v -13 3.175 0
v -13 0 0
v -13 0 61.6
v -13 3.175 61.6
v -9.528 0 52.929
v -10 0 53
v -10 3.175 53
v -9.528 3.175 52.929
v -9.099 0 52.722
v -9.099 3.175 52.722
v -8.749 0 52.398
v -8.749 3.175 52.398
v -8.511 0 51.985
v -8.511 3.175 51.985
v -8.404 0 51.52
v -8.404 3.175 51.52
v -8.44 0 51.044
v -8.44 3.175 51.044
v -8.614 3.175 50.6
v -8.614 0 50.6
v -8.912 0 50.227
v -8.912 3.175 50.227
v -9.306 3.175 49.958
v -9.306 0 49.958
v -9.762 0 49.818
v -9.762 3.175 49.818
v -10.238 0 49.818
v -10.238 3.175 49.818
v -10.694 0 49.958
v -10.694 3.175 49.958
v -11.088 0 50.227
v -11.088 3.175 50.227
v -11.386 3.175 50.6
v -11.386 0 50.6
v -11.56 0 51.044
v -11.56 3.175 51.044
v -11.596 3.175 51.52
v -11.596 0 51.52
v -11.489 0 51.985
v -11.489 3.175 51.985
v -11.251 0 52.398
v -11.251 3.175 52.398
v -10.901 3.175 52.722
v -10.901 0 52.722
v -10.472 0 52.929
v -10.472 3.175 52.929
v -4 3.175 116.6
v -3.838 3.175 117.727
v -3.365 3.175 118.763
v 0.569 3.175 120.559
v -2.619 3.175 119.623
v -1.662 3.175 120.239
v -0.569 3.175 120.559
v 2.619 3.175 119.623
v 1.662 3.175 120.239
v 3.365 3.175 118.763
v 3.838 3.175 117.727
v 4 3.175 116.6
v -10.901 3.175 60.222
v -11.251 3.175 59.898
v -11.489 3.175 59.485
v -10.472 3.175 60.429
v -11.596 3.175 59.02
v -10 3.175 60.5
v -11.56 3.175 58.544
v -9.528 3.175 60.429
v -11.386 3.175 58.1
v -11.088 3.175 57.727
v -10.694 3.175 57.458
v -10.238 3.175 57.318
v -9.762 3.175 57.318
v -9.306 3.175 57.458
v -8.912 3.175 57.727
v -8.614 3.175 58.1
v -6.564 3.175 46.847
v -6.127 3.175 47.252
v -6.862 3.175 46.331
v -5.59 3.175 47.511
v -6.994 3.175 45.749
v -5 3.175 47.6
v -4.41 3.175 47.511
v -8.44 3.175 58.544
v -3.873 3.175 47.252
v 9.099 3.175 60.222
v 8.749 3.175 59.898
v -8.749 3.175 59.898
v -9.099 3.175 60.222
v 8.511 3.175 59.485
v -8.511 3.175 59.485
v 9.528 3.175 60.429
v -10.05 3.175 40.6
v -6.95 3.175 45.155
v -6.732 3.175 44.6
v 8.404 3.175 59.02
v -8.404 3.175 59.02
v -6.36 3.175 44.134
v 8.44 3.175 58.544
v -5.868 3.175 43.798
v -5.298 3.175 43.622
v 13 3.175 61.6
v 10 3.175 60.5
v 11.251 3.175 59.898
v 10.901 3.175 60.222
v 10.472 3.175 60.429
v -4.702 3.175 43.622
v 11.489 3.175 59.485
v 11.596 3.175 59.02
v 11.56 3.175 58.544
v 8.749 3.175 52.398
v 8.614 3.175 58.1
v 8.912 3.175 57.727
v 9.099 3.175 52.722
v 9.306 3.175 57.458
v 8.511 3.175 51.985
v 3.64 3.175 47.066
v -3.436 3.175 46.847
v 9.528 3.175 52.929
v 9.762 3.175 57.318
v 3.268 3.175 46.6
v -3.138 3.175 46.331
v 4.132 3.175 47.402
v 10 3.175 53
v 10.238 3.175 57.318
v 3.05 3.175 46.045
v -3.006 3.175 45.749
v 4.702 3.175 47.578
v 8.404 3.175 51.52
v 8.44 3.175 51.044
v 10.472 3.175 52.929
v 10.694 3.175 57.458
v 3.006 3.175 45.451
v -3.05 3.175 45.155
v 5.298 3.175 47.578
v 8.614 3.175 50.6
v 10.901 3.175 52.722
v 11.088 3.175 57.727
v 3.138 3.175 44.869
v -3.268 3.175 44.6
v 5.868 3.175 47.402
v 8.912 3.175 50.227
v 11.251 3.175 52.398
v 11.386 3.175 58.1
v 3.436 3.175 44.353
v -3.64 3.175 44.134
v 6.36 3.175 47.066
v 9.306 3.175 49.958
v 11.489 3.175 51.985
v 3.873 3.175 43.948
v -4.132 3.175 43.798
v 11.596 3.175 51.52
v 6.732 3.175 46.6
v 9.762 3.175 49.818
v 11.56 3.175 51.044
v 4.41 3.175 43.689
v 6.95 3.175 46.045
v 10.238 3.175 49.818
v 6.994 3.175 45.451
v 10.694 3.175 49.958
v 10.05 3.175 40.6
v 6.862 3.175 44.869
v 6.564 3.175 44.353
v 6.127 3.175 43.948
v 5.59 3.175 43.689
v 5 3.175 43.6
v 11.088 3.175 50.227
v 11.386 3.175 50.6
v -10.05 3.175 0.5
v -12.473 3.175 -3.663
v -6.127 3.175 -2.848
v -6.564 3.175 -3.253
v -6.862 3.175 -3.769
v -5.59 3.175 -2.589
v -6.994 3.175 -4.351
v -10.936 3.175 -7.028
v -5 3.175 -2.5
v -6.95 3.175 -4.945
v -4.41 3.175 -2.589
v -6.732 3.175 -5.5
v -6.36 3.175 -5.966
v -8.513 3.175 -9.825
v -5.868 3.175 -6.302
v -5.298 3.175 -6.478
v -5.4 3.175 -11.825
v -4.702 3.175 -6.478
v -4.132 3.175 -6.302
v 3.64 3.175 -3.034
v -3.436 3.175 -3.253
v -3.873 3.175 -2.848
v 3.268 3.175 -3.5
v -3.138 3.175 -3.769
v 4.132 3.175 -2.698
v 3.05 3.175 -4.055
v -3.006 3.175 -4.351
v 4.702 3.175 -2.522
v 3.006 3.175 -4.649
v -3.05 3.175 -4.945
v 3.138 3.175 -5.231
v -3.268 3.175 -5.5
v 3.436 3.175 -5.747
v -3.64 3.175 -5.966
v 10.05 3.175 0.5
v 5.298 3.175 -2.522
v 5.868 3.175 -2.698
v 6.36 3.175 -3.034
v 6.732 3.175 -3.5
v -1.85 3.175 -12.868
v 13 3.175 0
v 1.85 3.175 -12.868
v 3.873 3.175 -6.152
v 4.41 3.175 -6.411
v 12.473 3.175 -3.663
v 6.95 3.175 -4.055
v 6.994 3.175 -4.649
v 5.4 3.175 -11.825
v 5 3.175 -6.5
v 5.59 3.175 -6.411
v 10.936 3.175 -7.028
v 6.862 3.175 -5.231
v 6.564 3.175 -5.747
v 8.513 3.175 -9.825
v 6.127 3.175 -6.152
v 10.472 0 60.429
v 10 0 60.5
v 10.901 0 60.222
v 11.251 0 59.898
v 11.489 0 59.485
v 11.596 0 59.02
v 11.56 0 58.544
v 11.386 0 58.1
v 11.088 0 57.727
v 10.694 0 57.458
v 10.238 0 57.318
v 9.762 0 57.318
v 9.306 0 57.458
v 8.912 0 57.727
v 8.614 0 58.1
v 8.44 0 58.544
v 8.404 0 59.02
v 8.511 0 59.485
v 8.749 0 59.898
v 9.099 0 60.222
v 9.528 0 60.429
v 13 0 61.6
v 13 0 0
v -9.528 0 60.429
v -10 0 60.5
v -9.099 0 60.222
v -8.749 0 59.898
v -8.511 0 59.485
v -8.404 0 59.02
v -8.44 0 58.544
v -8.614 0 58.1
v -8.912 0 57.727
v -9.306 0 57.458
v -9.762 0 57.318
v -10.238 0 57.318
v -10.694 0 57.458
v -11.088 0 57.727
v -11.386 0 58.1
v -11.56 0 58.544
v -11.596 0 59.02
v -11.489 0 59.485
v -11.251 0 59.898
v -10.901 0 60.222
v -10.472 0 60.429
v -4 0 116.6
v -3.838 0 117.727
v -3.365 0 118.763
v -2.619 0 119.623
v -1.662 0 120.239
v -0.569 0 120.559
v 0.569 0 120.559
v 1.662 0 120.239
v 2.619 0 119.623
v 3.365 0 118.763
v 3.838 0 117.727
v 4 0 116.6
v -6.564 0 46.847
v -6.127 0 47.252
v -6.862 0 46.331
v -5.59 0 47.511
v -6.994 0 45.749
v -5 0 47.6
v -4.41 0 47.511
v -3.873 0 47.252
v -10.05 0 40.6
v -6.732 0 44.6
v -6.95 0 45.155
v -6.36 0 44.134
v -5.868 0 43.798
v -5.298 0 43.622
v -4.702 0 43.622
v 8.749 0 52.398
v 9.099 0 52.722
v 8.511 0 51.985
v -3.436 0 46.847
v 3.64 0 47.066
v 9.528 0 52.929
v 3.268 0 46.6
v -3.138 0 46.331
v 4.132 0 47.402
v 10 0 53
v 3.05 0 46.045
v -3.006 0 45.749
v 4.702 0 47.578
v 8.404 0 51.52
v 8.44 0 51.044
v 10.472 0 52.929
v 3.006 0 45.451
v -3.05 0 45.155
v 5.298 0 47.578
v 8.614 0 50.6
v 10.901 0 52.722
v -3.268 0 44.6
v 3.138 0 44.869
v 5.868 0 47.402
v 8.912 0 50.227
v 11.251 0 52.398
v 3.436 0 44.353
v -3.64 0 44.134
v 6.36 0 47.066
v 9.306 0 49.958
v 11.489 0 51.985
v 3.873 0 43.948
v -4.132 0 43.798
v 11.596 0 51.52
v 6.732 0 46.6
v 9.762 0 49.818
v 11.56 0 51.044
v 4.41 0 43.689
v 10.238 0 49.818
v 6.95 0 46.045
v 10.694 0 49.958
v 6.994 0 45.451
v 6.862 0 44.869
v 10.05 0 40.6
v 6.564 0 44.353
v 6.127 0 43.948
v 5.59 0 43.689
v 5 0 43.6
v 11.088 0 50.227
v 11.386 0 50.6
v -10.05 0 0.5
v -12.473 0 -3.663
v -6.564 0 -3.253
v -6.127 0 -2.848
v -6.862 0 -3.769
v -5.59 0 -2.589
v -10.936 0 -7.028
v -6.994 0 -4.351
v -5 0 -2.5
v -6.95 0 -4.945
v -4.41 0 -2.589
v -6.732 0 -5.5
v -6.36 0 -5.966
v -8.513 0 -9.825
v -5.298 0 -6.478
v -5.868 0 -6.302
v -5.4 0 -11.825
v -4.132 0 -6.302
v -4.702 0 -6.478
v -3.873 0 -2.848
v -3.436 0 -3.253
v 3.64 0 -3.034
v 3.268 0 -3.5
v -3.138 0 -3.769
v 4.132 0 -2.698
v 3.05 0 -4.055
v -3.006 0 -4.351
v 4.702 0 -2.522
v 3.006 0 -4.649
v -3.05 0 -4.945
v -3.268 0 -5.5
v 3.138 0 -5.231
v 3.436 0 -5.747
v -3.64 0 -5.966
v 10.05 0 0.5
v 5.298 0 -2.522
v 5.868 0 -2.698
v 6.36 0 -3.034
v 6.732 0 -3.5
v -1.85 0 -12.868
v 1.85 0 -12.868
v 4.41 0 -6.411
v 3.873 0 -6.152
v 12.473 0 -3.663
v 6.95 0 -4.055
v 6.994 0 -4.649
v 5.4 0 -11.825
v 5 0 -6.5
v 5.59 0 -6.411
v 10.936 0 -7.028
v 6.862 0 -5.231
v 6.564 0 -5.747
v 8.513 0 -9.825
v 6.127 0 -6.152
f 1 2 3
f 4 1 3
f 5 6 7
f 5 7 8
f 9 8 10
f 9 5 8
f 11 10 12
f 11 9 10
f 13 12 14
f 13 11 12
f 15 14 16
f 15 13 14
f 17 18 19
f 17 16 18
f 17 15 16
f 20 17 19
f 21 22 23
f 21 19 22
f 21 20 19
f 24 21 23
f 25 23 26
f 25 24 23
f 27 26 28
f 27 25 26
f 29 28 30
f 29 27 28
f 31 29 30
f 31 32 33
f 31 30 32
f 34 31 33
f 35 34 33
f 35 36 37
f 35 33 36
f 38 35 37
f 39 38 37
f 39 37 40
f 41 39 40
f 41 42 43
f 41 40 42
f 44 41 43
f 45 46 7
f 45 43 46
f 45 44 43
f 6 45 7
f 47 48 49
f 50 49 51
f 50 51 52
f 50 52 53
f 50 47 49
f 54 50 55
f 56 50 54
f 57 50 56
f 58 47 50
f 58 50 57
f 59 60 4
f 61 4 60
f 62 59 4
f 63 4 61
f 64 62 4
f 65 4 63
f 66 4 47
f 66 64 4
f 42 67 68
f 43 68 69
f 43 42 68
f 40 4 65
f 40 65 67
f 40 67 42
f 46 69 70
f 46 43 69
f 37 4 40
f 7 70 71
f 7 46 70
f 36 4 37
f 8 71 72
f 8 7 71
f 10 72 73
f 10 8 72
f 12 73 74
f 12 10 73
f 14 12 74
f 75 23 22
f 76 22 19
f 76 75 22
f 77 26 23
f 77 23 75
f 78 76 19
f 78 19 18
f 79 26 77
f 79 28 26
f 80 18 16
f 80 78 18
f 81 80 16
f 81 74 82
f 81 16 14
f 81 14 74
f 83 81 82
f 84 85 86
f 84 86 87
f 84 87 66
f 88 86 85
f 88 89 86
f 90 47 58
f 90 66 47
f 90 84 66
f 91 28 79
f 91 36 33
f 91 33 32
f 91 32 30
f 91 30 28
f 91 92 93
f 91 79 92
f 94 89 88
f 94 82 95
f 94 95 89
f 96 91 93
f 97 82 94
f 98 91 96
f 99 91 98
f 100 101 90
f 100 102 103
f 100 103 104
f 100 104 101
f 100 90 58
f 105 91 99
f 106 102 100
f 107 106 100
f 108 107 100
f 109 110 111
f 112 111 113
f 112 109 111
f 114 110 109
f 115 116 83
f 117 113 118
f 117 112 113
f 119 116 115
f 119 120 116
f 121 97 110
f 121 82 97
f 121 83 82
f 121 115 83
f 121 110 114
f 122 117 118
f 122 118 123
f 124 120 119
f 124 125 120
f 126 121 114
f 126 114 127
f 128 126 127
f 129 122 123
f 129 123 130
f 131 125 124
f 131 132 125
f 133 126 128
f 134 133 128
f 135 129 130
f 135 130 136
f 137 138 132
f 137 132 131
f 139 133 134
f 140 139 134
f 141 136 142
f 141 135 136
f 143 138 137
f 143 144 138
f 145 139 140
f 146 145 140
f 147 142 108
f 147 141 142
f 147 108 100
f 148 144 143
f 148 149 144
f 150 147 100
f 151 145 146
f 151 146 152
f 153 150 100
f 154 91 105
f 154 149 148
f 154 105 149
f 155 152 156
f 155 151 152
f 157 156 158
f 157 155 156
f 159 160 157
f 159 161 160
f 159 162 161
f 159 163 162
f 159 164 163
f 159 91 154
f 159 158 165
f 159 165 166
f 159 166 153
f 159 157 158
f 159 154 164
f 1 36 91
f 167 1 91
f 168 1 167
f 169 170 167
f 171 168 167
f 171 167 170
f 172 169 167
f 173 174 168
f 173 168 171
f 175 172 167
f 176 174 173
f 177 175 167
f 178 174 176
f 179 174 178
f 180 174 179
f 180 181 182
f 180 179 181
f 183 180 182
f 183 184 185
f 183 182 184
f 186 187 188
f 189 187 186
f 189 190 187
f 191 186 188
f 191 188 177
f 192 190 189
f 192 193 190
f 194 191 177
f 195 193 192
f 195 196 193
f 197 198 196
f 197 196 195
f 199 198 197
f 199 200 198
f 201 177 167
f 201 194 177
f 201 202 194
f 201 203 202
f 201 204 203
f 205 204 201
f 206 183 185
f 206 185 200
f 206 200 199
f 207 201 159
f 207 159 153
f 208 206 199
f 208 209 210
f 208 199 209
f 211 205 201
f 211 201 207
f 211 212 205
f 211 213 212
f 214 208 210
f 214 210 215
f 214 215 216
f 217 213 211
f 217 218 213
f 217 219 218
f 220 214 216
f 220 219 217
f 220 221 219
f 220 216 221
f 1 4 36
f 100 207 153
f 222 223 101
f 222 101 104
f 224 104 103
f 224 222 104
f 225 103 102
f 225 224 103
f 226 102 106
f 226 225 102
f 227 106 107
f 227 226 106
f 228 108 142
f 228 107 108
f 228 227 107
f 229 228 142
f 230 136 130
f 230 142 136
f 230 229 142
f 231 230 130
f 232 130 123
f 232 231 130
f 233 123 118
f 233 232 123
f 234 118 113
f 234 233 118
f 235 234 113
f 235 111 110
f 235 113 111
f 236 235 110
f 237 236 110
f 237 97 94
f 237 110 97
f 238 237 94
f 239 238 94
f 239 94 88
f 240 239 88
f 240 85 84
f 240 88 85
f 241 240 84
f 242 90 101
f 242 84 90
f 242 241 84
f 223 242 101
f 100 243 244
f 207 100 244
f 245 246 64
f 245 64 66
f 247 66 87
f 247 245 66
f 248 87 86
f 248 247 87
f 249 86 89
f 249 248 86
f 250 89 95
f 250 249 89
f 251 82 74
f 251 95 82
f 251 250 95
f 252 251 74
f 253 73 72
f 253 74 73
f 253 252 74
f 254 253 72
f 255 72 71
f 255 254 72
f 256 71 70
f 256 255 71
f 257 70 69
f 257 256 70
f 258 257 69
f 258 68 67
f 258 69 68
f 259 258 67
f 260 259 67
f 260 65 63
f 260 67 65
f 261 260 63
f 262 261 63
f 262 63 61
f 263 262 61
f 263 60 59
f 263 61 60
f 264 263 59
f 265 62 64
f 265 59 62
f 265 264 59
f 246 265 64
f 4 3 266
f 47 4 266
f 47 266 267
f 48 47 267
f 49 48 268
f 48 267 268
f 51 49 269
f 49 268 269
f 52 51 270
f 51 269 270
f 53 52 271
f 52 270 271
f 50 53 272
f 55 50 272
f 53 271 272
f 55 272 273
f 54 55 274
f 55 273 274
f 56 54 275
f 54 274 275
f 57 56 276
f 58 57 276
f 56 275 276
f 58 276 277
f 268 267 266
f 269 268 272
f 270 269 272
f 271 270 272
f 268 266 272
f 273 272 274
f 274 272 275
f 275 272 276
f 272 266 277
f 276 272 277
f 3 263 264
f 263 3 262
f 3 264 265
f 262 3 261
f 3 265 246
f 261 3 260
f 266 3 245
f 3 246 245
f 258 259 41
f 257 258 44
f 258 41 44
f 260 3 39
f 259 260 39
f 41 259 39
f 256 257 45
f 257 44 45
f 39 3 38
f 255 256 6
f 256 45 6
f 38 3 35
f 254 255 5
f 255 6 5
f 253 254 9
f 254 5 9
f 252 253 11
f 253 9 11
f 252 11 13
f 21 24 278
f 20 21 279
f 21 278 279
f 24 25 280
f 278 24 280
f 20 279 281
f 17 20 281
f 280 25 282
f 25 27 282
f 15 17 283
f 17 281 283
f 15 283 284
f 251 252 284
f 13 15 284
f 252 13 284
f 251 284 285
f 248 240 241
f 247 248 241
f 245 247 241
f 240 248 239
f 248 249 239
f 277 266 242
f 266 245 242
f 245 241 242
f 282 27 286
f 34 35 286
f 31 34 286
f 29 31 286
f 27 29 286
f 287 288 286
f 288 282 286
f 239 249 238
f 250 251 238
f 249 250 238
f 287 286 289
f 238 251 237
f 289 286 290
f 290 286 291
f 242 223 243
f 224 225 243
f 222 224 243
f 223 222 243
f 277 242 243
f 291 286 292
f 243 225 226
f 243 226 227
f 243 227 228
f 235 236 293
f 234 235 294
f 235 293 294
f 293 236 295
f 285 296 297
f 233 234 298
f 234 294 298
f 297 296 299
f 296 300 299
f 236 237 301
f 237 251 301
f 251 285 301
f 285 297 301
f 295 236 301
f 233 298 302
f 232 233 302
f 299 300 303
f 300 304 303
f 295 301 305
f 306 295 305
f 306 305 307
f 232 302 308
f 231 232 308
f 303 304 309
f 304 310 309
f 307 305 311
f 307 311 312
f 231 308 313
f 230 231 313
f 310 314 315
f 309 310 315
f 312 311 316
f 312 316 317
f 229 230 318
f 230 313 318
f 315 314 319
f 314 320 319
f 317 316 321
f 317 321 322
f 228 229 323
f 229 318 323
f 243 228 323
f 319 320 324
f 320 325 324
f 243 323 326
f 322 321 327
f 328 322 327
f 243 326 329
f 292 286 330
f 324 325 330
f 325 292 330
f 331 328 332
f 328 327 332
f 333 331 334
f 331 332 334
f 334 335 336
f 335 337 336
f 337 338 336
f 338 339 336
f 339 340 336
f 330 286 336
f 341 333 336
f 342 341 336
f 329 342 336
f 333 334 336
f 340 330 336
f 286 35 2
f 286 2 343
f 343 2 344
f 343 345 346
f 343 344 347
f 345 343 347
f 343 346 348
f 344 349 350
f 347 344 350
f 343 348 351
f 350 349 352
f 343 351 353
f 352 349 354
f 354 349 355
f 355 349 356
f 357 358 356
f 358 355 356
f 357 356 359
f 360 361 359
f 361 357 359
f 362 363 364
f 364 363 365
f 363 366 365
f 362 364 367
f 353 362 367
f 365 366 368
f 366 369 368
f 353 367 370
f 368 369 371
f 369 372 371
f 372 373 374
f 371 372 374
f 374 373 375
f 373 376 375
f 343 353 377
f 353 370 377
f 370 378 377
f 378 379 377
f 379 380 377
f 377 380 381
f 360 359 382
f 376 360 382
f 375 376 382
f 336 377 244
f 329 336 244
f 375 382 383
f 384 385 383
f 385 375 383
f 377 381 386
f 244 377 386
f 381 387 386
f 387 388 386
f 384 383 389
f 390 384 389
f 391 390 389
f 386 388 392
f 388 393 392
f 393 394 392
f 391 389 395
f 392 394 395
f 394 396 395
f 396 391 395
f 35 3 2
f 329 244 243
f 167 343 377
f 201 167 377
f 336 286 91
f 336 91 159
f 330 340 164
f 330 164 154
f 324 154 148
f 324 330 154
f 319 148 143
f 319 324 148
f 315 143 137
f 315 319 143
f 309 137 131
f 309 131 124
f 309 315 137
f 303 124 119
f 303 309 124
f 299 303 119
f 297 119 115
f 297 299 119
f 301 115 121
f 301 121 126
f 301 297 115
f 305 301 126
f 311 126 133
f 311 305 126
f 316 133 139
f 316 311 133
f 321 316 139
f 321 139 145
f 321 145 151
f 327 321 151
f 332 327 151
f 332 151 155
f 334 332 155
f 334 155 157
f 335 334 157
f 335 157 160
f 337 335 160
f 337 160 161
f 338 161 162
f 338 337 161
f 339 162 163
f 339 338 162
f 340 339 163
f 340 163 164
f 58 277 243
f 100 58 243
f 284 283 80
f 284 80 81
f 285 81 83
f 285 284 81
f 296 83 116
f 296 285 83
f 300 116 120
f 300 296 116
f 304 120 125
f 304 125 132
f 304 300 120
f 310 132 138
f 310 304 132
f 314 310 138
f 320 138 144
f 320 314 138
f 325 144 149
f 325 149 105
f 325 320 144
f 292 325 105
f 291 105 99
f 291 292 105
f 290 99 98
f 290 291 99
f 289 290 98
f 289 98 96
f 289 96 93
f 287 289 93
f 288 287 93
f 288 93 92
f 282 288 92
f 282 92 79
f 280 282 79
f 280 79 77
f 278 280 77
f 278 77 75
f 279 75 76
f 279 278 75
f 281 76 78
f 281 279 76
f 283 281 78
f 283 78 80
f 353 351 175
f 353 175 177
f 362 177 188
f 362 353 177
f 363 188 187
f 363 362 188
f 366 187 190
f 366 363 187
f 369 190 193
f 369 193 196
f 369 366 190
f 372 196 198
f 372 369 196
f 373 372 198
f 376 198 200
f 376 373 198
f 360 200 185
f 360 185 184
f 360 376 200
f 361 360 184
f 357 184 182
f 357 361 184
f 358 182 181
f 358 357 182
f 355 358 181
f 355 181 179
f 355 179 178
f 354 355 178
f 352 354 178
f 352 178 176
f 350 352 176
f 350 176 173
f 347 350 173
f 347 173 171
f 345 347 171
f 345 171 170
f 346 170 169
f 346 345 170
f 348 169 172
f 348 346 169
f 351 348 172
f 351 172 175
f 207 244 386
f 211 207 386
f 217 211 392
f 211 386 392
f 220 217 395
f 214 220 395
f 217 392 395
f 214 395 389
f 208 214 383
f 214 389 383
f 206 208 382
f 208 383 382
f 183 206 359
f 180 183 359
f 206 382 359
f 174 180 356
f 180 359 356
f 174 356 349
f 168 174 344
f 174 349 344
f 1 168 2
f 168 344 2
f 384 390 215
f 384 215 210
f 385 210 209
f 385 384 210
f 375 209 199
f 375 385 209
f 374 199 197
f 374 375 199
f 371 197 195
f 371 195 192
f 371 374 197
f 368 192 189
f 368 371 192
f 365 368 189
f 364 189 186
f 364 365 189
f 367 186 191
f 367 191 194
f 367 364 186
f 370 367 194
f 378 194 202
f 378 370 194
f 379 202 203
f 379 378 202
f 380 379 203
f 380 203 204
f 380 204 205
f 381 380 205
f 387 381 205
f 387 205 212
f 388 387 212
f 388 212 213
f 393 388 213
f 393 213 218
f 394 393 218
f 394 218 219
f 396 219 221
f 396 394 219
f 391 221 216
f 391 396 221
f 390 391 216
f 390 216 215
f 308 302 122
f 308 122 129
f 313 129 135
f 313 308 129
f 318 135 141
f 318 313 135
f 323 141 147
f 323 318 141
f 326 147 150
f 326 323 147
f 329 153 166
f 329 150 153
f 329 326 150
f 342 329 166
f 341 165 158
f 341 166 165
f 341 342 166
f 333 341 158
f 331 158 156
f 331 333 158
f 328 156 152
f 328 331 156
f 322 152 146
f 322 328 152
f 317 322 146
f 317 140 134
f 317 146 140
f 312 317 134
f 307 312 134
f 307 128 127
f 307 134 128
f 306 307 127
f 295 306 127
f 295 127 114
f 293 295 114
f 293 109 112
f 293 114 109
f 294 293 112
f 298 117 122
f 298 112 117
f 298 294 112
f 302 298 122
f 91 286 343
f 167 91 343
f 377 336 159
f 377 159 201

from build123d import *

# Parameters (mm, degrees)
SKETCH2_R               = 2
SKETCH2_W               = 20.1
SKETCH2_H               = 40.1
BOSS_EXTRUDE1_DEPTH     = 3.175
CUT_EXTRUDE1_DEPTH      = 122.340185532
CUT_EXTRUDE1_DEPTH_BACK = 122.340185532
SKETCH3_R               = 1.6


with BuildPart() as part:
    # Sketch2 → Boss-Extrude1 (new body)
    with BuildSketch(Plane(origin=(0, 0, 0), x_dir=(1, 0, 0), z_dir=(0, 1, 0))):
        with BuildLine():
            Line((-13, 0), (-13, -61.6))
            Line((-13, -61.6), (-4, -116.6))
            ThreePointArc((-4, -116.6), (0, -120.6), (4, -116.6))
            Line((4, -116.6), (13, -61.6))
            Line((13, -61.6), (13, 0))
            ThreePointArc((13, 0), (0, 13), (-13, 0))
        make_face()
        with Locations(Location((-5, 4.5, 0), (0, 0, 270))):
            Circle(SKETCH2_R, mode=Mode.SUBTRACT)
        with Locations(Location((-5, -45.6, 0), (0, 0, 270))):
            Circle(SKETCH2_R, mode=Mode.SUBTRACT)
        with Locations(Location((5, -45.6, 0), (0, 0, 90))):
            Circle(SKETCH2_R, mode=Mode.SUBTRACT)
        with Locations(Location((5, 4.5, 0), (0, 0, 90))):
            Circle(SKETCH2_R, mode=Mode.SUBTRACT)
        with Locations((0, -20.55)):
            Rectangle(SKETCH2_W, SKETCH2_H, mode=Mode.SUBTRACT)
    extrude(amount=BOSS_EXTRUDE1_DEPTH)

    # Sketch3 → Cut-Extrude1 (cut, two sides: drawn at the far end of the back side and taken through both)
    with BuildSketch(Plane(origin=(0, 3.175, 0), x_dir=(1, 0, 0), z_dir=(0, 1, 0)).offset(-CUT_EXTRUDE1_DEPTH_BACK)):
        with Locations(Location((10, -58.9, 0), (0, 0, 270))):
            Circle(SKETCH3_R)
        with Locations(Location((10, -51.4, 0), (0, 0, 270))):
            Circle(SKETCH3_R)
        with Locations(Location((-10, -58.9, 0), (0, 0, 270))):
            Circle(SKETCH3_R)
        with Locations(Location((-10, -51.4, 0), (0, 0, 270))):
            Circle(SKETCH3_R)
    extrude(amount=CUT_EXTRUDE1_DEPTH + CUT_EXTRUDE1_DEPTH_BACK, mode=Mode.SUBTRACT)


solid = part.part
